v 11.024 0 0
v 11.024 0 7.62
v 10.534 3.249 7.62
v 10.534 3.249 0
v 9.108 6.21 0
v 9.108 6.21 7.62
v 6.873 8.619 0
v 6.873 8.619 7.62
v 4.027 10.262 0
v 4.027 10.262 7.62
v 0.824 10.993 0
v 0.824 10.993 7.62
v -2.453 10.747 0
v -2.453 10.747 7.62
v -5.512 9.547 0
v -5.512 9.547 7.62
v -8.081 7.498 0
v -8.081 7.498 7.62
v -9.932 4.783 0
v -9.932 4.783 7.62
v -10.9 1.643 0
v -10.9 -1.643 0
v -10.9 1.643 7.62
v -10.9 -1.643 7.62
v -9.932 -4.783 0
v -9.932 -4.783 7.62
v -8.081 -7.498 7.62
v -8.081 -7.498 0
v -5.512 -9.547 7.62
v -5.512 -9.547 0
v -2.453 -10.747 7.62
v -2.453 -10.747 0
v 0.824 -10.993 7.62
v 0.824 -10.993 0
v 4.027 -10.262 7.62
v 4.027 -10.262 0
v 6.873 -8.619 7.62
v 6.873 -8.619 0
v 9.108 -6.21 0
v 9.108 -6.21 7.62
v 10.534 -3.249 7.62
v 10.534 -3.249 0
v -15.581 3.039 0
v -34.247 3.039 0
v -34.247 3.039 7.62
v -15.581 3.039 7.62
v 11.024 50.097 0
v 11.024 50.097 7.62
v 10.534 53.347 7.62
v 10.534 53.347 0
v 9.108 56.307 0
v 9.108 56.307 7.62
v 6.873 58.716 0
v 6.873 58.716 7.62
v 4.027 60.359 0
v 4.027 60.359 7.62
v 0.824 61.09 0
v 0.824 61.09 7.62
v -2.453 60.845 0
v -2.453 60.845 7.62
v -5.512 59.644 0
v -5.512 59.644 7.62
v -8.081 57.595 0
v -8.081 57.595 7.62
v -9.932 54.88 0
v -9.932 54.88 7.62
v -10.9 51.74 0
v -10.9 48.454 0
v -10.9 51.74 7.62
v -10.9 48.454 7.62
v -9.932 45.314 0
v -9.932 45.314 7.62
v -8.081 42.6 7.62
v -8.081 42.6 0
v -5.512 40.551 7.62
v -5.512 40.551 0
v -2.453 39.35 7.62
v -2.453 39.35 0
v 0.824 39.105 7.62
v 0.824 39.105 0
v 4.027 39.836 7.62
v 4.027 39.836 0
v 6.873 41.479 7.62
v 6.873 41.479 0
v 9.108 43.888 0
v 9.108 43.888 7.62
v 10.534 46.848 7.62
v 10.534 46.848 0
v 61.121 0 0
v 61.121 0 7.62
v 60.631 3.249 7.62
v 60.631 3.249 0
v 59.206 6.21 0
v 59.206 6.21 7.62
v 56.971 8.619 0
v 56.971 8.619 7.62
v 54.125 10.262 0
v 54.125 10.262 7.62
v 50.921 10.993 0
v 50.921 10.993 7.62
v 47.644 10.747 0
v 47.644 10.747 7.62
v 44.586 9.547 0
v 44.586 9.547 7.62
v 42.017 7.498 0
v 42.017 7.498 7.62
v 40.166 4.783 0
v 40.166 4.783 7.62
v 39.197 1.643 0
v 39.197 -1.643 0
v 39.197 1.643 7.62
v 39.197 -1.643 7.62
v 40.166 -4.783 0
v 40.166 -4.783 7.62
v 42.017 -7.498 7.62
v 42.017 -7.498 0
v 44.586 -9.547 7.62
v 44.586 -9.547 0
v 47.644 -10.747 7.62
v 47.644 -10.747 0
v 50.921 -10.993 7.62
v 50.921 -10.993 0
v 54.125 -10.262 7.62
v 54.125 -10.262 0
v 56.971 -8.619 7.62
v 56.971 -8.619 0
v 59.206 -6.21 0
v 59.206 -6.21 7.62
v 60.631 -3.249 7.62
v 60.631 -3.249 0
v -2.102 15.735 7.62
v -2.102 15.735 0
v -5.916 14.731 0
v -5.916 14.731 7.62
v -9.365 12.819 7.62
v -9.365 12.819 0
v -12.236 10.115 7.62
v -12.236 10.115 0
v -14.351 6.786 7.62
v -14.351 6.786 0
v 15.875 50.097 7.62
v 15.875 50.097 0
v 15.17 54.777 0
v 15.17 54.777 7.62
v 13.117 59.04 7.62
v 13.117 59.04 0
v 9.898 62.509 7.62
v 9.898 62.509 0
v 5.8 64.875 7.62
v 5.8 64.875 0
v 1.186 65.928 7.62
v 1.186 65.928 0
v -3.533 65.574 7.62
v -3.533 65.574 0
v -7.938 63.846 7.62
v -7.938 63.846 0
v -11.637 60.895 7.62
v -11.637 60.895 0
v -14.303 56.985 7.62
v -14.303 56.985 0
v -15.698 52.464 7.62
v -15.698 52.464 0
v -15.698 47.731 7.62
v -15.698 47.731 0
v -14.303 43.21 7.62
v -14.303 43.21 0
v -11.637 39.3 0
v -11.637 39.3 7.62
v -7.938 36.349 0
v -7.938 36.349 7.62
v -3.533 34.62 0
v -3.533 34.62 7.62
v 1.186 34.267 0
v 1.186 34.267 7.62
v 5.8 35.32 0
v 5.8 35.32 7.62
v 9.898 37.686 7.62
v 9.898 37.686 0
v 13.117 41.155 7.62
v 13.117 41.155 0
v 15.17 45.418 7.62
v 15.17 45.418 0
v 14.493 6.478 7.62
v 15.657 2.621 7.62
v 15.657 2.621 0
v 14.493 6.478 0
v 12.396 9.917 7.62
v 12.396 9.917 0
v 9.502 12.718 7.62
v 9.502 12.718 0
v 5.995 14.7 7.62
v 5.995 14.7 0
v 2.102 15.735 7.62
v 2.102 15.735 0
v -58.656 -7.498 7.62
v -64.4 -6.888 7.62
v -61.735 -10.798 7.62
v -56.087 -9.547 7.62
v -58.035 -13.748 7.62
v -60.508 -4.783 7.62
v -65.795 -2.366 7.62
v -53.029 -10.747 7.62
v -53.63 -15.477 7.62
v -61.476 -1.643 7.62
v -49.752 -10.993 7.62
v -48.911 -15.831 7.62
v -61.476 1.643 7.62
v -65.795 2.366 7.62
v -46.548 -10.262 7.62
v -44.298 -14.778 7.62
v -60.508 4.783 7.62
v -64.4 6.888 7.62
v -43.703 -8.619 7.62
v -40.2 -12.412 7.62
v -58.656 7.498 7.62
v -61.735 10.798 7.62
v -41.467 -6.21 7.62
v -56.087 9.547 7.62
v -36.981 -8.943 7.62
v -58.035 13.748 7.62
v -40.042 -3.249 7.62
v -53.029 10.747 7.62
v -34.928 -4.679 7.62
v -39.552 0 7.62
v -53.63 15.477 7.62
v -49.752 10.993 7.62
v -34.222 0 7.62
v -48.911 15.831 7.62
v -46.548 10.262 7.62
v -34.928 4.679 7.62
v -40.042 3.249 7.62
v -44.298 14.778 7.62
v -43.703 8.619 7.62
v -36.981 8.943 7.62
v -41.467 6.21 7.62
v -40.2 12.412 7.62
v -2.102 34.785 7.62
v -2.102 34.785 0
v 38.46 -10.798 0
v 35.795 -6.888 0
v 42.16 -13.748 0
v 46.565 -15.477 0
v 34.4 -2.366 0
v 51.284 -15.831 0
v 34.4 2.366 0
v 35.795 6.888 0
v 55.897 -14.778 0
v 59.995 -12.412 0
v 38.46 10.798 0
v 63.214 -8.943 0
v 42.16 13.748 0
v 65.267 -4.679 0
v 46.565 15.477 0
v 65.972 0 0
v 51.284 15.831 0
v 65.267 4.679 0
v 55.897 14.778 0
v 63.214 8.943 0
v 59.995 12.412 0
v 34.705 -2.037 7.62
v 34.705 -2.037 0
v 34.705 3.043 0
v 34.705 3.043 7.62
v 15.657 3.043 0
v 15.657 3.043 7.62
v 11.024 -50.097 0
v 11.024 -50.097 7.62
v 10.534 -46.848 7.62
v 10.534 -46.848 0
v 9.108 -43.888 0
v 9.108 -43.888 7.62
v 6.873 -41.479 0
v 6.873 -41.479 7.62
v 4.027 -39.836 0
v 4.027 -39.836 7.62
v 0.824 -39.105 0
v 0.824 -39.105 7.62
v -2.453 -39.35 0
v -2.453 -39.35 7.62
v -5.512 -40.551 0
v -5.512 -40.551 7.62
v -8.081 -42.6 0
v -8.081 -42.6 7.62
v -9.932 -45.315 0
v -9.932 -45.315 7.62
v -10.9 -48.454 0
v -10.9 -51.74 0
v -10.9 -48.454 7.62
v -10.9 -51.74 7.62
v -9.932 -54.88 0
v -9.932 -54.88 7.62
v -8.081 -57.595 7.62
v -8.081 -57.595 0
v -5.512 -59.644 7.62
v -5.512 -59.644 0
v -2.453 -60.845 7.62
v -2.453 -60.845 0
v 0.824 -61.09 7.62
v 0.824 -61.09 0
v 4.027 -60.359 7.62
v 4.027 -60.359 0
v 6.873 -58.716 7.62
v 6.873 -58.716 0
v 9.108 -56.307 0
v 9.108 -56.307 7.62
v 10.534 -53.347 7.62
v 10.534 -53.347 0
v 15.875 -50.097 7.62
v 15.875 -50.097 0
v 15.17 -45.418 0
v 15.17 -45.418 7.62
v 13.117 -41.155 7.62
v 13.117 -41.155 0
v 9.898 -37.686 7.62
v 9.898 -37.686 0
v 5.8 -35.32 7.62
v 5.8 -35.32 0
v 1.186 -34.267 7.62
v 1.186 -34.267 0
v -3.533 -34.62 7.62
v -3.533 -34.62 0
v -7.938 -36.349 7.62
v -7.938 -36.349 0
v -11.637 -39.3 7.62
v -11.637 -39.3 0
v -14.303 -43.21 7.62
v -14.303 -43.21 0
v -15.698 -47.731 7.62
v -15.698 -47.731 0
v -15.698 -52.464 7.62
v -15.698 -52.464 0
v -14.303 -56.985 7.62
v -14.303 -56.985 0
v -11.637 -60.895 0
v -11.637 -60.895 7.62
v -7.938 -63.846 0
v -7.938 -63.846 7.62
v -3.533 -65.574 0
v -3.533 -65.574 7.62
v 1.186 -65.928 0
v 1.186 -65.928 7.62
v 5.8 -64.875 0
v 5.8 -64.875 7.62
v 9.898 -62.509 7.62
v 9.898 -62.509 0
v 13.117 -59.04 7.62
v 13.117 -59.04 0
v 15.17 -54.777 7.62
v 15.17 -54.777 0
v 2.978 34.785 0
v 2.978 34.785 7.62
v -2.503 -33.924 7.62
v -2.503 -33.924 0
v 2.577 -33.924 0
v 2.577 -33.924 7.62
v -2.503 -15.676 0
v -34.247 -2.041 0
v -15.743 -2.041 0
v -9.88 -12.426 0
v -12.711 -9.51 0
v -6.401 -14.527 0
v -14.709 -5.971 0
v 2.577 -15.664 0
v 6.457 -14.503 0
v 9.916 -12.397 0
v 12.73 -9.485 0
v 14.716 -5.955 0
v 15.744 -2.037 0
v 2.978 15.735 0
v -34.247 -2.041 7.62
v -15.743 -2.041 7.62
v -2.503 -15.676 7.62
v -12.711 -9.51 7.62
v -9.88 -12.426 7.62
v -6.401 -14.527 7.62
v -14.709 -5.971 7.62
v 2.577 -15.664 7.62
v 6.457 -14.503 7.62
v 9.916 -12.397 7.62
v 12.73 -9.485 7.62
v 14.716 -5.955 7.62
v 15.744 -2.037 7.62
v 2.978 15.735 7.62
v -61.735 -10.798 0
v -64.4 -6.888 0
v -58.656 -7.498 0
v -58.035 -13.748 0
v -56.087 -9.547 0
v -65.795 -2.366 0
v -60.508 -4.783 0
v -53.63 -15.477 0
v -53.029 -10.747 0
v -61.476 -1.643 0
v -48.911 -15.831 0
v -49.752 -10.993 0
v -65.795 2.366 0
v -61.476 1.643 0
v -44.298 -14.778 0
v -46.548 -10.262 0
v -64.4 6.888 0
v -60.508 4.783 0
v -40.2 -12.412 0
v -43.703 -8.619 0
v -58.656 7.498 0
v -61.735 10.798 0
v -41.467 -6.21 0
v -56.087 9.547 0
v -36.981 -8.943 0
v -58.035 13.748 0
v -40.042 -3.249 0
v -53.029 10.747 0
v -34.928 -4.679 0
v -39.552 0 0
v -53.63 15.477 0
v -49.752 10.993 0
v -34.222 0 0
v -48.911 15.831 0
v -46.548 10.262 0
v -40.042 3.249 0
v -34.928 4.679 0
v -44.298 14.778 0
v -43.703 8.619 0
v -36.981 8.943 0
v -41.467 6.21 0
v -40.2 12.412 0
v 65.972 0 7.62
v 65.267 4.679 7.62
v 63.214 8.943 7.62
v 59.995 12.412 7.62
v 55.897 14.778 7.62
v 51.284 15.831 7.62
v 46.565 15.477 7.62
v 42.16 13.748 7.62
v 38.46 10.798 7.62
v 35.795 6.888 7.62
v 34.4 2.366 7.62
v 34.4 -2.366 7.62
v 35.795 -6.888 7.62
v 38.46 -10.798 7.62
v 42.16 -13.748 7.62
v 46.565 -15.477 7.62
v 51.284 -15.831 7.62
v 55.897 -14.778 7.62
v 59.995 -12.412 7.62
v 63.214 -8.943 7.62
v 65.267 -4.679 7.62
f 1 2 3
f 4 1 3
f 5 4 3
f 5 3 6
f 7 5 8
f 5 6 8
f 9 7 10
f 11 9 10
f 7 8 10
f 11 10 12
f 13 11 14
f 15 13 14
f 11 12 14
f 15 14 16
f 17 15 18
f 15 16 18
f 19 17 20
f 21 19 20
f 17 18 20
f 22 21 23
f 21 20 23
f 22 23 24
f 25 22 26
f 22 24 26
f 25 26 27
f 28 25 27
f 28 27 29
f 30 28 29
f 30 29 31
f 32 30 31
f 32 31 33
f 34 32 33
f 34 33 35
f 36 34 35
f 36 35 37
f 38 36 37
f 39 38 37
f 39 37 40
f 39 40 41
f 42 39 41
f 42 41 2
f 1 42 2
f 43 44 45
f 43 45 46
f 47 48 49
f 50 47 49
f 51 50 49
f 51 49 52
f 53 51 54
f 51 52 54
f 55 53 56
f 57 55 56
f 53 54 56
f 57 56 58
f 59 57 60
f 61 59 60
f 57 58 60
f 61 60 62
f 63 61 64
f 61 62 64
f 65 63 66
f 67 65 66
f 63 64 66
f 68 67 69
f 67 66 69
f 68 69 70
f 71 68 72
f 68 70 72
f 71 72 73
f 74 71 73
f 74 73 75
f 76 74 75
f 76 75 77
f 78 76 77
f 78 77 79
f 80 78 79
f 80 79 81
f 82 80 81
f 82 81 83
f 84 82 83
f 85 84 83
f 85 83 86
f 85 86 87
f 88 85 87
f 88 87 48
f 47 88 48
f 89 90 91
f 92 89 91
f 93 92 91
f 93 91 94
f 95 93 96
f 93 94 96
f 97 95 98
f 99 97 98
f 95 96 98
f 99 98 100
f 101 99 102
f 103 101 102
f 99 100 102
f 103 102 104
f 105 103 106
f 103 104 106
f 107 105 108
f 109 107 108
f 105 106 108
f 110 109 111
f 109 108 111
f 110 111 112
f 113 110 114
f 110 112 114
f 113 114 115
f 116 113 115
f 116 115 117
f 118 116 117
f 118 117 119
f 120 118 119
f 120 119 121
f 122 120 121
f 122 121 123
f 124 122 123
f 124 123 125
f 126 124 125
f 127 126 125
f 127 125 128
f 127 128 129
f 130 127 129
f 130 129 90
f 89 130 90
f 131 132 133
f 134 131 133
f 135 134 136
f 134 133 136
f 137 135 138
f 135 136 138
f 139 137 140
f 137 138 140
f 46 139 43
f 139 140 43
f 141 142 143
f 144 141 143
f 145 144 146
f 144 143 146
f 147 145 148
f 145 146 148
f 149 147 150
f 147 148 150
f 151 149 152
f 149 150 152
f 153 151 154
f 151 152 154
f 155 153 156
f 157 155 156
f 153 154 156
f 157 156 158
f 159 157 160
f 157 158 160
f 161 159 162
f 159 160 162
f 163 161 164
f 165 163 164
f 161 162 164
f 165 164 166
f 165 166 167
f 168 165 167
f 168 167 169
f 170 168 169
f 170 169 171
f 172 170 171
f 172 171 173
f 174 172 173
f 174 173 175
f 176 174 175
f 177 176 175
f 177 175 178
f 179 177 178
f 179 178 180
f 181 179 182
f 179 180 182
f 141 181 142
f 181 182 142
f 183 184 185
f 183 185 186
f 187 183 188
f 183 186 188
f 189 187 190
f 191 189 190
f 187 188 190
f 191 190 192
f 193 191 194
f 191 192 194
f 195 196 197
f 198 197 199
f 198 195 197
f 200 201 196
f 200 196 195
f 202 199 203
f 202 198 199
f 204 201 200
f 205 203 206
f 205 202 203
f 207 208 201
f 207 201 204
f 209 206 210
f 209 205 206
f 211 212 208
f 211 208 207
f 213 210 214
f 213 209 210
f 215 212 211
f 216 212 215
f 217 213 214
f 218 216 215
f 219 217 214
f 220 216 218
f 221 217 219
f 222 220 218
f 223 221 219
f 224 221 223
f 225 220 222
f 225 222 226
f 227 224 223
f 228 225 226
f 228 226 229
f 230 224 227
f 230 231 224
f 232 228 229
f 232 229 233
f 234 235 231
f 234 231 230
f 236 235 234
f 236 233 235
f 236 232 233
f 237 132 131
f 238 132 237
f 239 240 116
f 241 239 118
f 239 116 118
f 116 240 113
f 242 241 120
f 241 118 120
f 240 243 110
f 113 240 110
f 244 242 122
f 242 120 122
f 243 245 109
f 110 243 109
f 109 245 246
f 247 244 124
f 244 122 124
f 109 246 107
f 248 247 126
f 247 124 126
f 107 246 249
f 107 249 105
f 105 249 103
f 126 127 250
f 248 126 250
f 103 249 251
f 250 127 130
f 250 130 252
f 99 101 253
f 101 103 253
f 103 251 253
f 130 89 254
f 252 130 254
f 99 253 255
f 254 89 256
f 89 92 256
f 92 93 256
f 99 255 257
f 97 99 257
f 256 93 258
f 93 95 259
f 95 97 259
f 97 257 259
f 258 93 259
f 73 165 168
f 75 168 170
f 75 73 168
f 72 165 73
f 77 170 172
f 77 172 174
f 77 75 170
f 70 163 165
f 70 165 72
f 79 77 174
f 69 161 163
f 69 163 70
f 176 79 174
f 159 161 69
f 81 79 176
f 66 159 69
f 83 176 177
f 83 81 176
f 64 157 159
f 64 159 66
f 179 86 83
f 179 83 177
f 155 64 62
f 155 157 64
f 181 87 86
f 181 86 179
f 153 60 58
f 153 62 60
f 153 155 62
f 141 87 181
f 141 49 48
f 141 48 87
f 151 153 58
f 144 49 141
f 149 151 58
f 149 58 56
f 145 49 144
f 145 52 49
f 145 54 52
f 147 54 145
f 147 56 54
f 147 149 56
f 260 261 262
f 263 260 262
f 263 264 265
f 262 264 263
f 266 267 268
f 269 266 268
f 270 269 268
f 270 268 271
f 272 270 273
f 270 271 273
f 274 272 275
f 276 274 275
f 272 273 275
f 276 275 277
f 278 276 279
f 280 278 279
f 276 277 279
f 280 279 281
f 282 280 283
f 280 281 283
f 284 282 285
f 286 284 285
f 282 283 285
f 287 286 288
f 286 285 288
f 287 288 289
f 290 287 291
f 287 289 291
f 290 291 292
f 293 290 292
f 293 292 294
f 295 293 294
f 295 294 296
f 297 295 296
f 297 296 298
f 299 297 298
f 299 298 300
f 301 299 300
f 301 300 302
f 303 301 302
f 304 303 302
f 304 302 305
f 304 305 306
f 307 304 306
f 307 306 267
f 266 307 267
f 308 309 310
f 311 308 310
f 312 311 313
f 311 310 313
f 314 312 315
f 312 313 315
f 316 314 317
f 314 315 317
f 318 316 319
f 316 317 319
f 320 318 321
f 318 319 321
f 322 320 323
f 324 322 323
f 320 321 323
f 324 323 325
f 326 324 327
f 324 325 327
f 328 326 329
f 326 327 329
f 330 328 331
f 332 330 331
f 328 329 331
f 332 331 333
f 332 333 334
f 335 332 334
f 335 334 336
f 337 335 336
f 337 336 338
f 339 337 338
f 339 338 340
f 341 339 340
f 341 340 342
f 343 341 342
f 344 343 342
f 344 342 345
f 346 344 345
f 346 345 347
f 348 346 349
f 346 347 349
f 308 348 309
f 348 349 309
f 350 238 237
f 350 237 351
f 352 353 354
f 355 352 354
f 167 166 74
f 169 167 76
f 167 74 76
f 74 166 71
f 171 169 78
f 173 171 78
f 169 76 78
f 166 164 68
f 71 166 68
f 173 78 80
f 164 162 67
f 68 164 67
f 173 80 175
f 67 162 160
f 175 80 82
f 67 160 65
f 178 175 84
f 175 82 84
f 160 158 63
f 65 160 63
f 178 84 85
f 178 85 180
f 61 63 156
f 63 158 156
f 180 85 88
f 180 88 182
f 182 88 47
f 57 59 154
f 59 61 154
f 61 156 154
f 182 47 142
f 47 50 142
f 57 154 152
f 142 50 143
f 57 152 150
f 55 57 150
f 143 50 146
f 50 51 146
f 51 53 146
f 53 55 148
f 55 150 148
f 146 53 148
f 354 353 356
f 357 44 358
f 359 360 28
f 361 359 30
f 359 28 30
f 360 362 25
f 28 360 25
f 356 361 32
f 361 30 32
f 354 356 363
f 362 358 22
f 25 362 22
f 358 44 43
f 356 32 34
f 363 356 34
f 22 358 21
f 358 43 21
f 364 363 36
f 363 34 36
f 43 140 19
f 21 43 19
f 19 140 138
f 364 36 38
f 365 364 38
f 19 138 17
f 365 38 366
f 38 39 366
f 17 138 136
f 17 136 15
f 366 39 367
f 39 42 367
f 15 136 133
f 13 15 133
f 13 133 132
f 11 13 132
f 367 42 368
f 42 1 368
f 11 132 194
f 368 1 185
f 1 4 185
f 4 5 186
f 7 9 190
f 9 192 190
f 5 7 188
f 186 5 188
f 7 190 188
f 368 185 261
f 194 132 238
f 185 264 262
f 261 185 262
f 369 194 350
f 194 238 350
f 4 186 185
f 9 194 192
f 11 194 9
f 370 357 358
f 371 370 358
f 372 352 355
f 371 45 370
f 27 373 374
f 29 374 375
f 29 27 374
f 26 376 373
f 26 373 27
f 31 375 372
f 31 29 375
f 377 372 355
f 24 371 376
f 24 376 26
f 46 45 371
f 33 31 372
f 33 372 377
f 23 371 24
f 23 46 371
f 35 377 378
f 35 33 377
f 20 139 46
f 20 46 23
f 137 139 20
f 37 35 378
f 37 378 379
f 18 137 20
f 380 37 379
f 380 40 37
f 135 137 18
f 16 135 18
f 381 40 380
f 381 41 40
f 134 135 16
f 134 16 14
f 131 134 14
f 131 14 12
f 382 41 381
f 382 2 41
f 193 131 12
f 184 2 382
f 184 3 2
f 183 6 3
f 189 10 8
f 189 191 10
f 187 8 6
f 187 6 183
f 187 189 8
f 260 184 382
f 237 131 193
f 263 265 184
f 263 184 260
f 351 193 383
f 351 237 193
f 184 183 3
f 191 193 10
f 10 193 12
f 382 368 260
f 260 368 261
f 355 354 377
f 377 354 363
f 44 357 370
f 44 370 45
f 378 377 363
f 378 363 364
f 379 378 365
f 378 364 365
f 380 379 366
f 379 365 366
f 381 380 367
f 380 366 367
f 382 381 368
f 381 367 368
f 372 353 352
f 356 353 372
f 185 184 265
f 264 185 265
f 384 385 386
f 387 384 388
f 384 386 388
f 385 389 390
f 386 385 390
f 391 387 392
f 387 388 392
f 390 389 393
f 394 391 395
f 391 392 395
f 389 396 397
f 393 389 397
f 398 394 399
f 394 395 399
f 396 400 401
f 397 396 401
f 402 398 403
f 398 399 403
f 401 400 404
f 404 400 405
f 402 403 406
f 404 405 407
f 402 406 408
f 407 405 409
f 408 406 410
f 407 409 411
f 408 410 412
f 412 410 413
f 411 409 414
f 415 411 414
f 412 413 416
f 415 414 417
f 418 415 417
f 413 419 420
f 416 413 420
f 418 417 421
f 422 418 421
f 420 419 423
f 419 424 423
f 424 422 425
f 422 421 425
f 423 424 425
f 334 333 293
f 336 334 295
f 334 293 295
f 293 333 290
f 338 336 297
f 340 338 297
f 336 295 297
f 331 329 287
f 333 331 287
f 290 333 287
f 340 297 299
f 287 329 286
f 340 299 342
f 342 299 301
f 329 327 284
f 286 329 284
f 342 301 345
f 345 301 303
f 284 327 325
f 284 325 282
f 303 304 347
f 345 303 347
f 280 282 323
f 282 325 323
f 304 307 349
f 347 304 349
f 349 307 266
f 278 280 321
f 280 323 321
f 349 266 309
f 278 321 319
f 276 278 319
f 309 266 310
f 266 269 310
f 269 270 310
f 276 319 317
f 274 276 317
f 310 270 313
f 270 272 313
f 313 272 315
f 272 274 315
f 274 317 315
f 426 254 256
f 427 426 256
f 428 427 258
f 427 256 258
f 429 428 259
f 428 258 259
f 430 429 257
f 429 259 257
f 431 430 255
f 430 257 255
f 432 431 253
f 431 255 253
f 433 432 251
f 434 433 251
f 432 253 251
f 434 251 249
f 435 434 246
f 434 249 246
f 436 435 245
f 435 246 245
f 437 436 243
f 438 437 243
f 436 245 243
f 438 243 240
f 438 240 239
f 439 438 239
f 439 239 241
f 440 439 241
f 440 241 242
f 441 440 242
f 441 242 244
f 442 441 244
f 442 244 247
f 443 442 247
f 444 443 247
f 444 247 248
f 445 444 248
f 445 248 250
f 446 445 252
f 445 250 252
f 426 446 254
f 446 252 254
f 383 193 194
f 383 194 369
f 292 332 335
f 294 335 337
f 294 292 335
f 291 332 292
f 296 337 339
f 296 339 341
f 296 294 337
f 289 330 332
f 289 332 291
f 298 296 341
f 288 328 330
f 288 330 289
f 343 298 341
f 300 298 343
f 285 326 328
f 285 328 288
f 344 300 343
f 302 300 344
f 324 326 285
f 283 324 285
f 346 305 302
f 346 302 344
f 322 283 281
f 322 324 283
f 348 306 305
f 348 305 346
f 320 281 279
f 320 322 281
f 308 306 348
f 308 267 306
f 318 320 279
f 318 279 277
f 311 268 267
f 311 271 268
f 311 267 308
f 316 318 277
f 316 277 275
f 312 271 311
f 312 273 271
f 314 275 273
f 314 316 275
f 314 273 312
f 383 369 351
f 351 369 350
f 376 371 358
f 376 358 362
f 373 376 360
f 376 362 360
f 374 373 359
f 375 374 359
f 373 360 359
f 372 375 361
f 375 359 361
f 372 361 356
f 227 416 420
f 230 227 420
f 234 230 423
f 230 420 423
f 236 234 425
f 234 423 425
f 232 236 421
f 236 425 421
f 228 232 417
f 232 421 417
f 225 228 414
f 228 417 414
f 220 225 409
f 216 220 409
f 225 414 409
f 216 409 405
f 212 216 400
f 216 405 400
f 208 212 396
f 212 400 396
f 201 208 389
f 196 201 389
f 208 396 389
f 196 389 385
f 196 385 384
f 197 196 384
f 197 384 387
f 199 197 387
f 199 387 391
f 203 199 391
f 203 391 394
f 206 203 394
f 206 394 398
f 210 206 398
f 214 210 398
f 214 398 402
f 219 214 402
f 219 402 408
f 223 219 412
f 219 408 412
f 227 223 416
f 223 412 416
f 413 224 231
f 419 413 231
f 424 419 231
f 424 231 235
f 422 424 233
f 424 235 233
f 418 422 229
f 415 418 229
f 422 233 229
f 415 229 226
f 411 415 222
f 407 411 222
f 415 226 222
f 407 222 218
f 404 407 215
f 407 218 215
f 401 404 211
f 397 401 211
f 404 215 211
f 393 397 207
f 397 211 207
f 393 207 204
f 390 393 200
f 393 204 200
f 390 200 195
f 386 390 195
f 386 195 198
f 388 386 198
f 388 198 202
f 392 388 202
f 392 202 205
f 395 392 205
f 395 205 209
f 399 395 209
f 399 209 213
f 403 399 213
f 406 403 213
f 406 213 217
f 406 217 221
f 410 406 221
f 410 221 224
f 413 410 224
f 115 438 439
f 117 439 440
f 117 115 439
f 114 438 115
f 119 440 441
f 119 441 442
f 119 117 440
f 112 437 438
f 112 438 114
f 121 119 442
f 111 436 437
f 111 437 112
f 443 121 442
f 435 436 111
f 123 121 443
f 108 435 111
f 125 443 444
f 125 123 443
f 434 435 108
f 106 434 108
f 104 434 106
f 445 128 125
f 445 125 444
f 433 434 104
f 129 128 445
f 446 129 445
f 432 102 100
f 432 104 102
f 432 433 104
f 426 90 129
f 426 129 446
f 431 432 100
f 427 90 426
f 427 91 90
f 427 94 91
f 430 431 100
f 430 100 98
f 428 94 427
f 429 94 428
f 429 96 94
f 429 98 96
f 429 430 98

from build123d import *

# Parameters (mm, degrees)
F0_R      = 15.875
F1_DEPTH  = 7.62
F2_R      = 11.0236
F3_DEPTH  = 25.4
F4_W      = 19.047736
F4_H      = 5.08
F5_DEPTH  = 7.62
F6_W      = 5.08
F6_H      = 19.05
F7_DEPTH  = 7.62
F8_W      = 5.08
F8_H      = 19.05
F9_DEPTH  = 7.62
F10_W     = 19.05
F10_H     = 5.08
F11_DEPTH = 7.62
F12_R     = 15.875
F13_DEPTH = 7.62
F14_R     = 11.0236
F15_DEPTH = 25.4
F16_R     = 11.0236
F17_DEPTH = 25.4
F18_R     = 11.0236
F19_DEPTH = 25.4
F20_R     = 11.0236
F21_DEPTH = 25.4


with BuildPart() as f1:
    # F0 (on Top) → F1 (new body)
    with BuildSketch(Plane.XY):
        Circle(F0_R)
    extrude(amount=F1_DEPTH)

    # F2 (on face) → F3 (cut)
    with BuildSketch(Plane.XY.offset(7.62)):
        Circle(F2_R)
    extrude(amount=-F3_DEPTH, mode=Mode.SUBTRACT)

    # F4 (on Top) → F5 (join)
    with BuildSketch(Plane.XY):
        with Locations((25.180948, 0.502541)):
            Rectangle(F4_W, F4_H)
    extrude(amount=F5_DEPTH)

    # F6 (on Top) → F7 (join)
    with BuildSketch(Plane.XY):
        with Locations((0.036802, -24.399011)):
            Rectangle(F6_W, F6_H)
    extrude(amount=F7_DEPTH)

    # F8 (on Top) → F9 (join)
    with BuildSketch(Plane.XY):
        with Locations((0.437803, 25.260196)):
            Rectangle(F8_W, F8_H)
    extrude(amount=F9_DEPTH)

    # F10 (on Top) → F11 (join)
    with BuildSketch(Plane.XY):
        with Locations((-24.722495, 0.499337)):
            Rectangle(F10_W, F10_H)
    extrude(amount=F11_DEPTH)


with BuildPart() as f13:
    # F12 (on Top) → F13 (new body)
    with BuildSketch(Plane.XY):
        with Locations((0, 50.097458)):
            Circle(F12_R)
        with Locations((-50.097461, 0)):
            Circle(F12_R)
        with Locations((50.097461, 0)):
            Circle(F12_R)
        with Locations((0, -50.097461)):
            Circle(F12_R)
    extrude(amount=F13_DEPTH)

    # F14 (on face) → F15 (cut)
    with BuildSketch(Plane.XY.offset(7.62)):
        with Locations((-50.575616, 0)):
            Circle(F14_R)
    extrude(amount=-F15_DEPTH, mode=Mode.SUBTRACT)

    # F16 (on face) → F17 (cut)
    with BuildSketch(Plane.XY.offset(7.62)):
        with Locations((0, 50.097458)):
            Circle(F16_R)
    extrude(amount=-F17_DEPTH, mode=Mode.SUBTRACT)

    # F18 (on face) → F19 (cut)
    with BuildSketch(Plane.XY.offset(7.62)):
        with Locations((50.097461, 0)):
            Circle(F18_R)
    extrude(amount=-F19_DEPTH, mode=Mode.SUBTRACT)

    # F20 (on face) → F21 (cut)
    with BuildSketch(Plane.XY.offset(7.62)):
        with Locations((0, -50.097461)):
            Circle(F20_R)
    extrude(amount=-F21_DEPTH, mode=Mode.SUBTRACT)


solid = Compound([f1.part, f13.part])
